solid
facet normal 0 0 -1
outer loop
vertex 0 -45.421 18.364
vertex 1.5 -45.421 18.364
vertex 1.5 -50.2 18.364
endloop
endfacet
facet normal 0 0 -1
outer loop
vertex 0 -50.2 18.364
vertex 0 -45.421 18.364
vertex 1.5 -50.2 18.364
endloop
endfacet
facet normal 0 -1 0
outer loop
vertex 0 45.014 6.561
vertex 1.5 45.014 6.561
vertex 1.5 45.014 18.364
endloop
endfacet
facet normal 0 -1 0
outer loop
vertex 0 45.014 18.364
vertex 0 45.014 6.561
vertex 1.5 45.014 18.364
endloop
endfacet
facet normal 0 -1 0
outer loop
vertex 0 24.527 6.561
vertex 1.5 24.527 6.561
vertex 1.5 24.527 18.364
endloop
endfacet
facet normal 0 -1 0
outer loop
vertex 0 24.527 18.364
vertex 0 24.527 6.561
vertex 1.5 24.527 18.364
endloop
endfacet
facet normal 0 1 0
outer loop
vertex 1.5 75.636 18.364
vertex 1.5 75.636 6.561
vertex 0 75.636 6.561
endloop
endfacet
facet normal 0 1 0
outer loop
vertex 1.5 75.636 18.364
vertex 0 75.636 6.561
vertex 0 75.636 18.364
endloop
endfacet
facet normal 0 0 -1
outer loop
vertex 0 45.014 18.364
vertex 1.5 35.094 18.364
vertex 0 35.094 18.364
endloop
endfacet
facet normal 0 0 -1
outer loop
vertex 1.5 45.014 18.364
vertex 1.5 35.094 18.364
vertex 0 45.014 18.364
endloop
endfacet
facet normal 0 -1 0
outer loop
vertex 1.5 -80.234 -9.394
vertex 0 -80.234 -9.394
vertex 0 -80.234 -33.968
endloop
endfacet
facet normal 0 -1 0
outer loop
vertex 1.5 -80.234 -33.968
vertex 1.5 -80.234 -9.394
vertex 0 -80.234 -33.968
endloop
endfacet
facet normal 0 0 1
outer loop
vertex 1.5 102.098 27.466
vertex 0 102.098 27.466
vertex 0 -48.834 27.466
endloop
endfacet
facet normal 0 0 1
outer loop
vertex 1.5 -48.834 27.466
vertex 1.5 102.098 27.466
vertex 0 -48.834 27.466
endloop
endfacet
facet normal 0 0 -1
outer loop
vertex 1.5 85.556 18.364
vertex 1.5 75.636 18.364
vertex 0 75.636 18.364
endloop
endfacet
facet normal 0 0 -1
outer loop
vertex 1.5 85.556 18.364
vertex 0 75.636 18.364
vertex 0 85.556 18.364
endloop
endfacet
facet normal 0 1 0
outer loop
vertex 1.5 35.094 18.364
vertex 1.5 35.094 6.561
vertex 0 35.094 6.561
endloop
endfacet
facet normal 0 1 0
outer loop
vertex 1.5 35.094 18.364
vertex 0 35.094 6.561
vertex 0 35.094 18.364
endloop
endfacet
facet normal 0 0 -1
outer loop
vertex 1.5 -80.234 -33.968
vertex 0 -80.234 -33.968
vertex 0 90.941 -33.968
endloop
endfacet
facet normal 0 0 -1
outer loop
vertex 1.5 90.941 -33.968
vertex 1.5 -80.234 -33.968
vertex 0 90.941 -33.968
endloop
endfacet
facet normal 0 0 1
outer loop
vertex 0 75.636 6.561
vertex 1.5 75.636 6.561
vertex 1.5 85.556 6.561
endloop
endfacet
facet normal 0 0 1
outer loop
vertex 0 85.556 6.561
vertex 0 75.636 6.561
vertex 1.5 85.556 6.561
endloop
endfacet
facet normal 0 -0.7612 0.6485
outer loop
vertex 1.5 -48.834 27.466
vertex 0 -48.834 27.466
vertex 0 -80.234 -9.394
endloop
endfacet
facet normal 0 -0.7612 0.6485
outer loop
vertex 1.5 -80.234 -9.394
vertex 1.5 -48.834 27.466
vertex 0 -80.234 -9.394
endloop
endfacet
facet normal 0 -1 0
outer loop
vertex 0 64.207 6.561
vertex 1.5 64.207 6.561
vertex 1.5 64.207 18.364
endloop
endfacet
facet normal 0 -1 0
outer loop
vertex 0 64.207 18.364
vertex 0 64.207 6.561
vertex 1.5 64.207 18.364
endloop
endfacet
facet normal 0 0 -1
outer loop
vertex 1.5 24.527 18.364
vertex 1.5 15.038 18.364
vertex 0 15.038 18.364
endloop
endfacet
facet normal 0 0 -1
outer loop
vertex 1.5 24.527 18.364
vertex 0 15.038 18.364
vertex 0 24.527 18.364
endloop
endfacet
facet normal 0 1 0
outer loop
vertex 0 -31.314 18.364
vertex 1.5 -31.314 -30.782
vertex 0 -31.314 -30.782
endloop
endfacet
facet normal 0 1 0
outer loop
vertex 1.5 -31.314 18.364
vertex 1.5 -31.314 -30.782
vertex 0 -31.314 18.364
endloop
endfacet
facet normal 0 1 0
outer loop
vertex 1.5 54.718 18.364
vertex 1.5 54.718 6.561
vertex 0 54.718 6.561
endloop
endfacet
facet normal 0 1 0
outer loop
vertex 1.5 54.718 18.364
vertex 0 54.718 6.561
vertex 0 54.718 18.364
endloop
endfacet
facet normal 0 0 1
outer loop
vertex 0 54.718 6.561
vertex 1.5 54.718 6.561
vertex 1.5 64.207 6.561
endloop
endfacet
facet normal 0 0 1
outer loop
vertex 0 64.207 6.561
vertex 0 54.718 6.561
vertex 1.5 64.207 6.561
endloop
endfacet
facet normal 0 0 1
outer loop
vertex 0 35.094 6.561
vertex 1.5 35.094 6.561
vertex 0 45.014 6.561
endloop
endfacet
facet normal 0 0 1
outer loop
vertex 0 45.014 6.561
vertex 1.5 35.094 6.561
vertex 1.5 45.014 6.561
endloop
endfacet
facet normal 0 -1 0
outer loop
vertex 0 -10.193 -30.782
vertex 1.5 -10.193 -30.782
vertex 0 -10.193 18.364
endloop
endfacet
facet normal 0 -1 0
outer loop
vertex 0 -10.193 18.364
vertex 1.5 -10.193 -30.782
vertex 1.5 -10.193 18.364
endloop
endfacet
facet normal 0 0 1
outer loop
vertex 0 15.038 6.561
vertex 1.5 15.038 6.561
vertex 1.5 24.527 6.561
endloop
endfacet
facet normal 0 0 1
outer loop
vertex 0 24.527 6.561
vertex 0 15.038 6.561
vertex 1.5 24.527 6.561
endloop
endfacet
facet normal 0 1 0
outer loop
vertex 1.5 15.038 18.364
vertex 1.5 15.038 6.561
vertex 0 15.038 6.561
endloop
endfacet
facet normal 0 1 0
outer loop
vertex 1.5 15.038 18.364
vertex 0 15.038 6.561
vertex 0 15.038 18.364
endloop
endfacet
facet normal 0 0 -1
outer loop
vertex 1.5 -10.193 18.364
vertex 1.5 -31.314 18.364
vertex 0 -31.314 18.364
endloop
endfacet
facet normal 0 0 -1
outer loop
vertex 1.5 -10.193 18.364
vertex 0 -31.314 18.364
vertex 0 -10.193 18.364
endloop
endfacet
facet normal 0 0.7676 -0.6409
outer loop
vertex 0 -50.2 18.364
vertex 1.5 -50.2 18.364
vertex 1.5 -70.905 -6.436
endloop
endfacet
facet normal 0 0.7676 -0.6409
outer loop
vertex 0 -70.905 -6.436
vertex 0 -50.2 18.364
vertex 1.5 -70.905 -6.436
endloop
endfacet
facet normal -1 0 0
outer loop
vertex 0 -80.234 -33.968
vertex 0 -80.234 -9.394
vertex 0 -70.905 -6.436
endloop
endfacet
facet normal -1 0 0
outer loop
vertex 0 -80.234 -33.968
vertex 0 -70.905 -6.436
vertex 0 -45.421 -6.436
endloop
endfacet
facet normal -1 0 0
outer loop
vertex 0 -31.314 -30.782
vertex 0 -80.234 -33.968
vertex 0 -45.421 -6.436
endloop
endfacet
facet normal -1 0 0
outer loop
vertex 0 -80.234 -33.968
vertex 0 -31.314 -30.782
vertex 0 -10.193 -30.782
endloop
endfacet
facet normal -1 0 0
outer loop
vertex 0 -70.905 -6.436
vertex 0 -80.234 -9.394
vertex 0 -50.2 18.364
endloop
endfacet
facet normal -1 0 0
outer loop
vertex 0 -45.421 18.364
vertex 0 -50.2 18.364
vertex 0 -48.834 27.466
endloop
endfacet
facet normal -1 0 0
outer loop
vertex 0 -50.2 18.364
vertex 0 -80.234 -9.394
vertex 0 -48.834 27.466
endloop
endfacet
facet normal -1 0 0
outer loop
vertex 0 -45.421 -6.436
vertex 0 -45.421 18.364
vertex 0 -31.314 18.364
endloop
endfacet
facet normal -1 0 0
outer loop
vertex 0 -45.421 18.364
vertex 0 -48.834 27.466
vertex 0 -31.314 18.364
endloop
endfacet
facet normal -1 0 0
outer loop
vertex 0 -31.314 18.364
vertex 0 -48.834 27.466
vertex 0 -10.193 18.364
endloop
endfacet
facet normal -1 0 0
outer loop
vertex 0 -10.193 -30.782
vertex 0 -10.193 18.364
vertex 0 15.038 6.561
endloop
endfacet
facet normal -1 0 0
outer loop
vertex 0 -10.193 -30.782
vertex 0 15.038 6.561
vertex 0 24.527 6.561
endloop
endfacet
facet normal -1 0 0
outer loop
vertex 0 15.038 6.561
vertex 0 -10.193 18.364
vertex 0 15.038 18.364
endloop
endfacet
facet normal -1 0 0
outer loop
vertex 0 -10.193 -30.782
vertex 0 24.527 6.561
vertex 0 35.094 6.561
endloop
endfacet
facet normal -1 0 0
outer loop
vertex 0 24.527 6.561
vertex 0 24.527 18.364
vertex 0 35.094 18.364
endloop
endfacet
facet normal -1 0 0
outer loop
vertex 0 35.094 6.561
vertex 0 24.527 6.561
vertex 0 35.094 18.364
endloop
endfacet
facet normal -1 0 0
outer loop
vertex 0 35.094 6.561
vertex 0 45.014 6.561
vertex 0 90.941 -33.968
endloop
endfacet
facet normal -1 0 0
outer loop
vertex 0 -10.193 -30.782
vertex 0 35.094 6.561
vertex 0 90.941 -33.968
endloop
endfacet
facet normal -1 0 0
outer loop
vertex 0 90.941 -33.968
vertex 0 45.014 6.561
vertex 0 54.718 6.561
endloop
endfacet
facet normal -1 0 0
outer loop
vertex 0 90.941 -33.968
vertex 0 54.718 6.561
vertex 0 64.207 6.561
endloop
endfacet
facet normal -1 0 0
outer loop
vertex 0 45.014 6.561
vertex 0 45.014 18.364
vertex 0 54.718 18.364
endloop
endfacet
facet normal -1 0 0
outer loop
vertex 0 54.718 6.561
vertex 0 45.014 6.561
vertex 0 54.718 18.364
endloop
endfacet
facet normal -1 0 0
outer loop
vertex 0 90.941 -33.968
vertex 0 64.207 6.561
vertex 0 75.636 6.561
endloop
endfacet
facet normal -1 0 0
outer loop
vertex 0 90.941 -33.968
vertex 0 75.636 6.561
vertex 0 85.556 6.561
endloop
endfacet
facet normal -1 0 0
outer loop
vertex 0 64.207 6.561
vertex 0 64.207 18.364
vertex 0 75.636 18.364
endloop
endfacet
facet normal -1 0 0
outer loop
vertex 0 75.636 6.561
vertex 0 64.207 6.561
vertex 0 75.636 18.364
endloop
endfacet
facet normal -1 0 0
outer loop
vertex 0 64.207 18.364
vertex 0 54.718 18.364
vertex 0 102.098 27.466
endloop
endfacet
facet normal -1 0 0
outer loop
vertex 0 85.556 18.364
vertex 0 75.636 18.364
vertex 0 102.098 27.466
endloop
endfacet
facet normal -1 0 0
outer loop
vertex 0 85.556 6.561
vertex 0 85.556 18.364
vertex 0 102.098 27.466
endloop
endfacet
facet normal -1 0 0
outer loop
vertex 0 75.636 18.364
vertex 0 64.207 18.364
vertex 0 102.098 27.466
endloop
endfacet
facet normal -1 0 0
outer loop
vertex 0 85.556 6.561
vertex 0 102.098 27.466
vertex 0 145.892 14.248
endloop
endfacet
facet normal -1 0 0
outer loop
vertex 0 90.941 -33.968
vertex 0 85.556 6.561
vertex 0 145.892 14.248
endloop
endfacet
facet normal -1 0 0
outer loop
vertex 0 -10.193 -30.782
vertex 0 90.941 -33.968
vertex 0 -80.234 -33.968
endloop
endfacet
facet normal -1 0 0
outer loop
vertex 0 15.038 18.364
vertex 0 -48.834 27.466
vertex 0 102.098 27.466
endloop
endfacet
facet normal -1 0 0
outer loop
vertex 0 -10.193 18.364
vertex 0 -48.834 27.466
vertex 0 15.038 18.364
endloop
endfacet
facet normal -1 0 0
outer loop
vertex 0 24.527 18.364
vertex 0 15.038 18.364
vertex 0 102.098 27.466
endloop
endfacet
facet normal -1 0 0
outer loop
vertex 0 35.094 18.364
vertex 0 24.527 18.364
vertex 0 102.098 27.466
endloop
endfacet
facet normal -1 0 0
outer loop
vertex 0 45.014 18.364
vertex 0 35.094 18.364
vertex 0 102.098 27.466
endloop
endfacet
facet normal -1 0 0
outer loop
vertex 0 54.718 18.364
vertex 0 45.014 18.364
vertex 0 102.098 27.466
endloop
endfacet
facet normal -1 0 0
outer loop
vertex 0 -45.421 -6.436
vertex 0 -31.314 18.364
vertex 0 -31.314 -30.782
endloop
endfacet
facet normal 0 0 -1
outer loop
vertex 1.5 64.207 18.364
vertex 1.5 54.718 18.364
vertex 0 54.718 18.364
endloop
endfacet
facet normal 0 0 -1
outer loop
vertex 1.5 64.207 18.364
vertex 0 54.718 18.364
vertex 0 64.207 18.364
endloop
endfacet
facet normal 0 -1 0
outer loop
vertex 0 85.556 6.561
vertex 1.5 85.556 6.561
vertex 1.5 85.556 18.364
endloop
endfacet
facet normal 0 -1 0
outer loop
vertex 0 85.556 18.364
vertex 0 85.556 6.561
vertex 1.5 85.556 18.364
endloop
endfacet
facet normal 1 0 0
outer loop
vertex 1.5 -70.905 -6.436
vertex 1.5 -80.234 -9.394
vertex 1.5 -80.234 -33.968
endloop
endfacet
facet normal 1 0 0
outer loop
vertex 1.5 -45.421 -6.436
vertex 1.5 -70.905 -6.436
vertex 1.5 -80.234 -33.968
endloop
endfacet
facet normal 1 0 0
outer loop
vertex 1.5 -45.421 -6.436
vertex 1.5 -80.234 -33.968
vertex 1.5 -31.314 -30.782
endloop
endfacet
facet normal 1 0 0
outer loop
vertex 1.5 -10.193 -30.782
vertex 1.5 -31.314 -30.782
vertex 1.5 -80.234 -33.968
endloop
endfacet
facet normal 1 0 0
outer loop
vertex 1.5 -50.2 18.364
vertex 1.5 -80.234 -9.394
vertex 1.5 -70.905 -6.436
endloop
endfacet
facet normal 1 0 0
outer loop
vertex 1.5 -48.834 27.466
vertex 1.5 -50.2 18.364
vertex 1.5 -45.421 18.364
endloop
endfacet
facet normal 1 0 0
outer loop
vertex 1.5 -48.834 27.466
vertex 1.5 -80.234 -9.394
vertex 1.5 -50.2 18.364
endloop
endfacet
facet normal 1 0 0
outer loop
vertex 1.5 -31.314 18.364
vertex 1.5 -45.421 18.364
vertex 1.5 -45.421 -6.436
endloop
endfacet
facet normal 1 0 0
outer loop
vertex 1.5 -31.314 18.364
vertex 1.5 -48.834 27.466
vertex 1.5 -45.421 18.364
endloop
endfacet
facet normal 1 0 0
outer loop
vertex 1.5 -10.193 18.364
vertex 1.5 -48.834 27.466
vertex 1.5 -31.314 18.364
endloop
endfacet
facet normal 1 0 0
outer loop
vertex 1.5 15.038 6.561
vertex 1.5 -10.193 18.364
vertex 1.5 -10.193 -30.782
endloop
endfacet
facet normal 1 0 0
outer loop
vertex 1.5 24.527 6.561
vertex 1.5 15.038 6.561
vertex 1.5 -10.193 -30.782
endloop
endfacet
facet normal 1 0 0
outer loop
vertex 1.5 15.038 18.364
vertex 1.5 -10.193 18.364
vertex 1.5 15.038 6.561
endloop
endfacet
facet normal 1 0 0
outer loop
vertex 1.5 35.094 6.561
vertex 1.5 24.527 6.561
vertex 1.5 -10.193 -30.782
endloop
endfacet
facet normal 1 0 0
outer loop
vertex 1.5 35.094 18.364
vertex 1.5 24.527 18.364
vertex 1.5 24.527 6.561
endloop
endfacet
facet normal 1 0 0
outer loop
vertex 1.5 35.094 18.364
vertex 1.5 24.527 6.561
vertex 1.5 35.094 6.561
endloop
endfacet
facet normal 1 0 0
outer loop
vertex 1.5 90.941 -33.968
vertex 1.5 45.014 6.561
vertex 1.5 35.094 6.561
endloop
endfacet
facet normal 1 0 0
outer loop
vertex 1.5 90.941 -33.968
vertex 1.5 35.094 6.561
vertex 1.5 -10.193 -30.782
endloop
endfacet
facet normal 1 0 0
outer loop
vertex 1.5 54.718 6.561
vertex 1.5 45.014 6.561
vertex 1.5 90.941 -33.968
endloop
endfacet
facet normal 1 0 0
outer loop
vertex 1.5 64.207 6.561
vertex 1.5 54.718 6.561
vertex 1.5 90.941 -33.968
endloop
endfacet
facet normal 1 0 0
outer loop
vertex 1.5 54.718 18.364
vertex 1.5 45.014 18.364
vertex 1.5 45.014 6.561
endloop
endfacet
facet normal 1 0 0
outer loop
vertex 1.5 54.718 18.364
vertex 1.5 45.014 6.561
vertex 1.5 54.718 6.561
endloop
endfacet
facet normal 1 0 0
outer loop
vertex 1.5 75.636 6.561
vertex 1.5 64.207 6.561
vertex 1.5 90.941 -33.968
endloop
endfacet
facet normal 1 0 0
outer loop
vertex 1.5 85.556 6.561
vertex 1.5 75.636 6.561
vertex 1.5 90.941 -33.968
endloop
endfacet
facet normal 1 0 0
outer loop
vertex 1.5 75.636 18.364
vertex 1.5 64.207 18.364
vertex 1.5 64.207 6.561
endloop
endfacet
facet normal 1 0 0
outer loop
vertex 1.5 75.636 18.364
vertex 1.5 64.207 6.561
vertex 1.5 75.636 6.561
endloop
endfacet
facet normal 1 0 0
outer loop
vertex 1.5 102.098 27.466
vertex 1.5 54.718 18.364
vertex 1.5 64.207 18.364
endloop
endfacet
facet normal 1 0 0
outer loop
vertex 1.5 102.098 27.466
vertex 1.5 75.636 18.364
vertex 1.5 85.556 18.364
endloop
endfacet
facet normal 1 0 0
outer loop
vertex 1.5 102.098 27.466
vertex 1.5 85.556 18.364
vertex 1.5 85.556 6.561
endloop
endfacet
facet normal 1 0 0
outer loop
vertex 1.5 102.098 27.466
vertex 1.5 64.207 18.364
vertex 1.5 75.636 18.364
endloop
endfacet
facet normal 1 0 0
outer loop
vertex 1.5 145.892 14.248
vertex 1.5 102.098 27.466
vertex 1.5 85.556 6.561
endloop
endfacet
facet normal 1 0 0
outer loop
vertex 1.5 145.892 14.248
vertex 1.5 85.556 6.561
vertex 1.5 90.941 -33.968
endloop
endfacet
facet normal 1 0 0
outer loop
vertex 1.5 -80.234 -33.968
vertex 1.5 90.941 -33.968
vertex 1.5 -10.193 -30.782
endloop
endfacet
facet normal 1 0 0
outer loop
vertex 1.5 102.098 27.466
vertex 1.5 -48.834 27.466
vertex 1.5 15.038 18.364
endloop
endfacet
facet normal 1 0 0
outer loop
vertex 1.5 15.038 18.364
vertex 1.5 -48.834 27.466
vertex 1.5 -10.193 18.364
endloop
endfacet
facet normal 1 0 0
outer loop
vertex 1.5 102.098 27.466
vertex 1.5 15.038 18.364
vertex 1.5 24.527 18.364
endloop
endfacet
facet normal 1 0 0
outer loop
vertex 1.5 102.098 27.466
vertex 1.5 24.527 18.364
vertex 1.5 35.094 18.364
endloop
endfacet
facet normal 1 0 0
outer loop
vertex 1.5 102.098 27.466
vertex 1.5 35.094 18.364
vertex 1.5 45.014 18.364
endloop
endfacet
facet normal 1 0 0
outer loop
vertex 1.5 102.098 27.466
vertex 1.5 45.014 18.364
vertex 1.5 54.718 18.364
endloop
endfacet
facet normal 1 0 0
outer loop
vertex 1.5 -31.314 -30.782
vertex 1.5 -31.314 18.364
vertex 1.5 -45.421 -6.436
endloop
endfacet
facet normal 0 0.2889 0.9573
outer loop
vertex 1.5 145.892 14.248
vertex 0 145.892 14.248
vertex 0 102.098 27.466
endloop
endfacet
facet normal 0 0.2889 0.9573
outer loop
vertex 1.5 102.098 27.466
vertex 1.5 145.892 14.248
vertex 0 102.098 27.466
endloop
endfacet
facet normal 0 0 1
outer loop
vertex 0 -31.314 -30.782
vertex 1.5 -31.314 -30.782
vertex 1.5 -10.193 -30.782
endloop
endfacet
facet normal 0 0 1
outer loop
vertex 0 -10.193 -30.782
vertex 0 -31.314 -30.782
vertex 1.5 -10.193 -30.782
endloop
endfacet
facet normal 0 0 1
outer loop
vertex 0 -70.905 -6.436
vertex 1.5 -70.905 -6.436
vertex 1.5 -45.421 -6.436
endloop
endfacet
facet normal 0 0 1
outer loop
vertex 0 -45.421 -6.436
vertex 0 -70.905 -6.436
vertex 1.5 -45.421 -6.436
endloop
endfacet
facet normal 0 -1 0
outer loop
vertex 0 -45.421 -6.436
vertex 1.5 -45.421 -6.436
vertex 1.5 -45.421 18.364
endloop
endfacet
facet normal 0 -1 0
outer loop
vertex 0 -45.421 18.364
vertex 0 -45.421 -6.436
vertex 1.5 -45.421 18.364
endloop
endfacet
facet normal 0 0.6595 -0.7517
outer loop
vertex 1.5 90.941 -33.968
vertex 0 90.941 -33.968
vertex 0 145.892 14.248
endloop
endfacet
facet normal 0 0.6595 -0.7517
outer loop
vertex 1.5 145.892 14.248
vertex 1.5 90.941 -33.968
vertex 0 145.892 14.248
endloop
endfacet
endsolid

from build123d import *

# Parameters (mm, degrees)
F1_DEPTH = 1.5
F2_W     = 21.121388
F2_H     = 49.146654
F2_W_2   = 9.488664
F2_H_2   = 11.803286
F2_W_3   = 9.919964
F2_W_4   = 9.919956
F3_DEPTH = 1.5


with BuildPart() as f1:
    # F0 (on Right) → F1 (new body)
    with BuildSketch(Plane.YZ):
        Polygon((-80.233574, -9.394377), (-80.233574, -33.967704), (90.941433, -33.967704), (145.892367, 14.248275), (102.09786, 27.465614), (-48.834328, 27.465614), align=None)
    extrude(amount=F1_DEPTH)

    # F2 (on face) → F3 (cut)
    with BuildSketch(Plane.YZ.offset(1.5)):
        Polygon((-50.199509, 18.364381), (-70.904814, -6.436477), (-45.421362, -6.436477), (-45.421362, 18.364381), align=None)
        with Locations((-20.753761, -6.208946)):
            Rectangle(F2_W, F2_H)
        with Locations((19.782484, 12.462738)):
            Rectangle(F2_W_2, F2_H_2)
        with Locations((40.053718, 12.462738)):
            Rectangle(F2_W_3, F2_H_2)
        with Locations((59.46235, 12.462738)):
            Rectangle(F2_W_2, F2_H_2)
        with Locations((80.596194, 12.462738)):
            Rectangle(F2_W_4, F2_H_2)
    extrude(amount=-F3_DEPTH, mode=Mode.SUBTRACT)


solid = f1.part
